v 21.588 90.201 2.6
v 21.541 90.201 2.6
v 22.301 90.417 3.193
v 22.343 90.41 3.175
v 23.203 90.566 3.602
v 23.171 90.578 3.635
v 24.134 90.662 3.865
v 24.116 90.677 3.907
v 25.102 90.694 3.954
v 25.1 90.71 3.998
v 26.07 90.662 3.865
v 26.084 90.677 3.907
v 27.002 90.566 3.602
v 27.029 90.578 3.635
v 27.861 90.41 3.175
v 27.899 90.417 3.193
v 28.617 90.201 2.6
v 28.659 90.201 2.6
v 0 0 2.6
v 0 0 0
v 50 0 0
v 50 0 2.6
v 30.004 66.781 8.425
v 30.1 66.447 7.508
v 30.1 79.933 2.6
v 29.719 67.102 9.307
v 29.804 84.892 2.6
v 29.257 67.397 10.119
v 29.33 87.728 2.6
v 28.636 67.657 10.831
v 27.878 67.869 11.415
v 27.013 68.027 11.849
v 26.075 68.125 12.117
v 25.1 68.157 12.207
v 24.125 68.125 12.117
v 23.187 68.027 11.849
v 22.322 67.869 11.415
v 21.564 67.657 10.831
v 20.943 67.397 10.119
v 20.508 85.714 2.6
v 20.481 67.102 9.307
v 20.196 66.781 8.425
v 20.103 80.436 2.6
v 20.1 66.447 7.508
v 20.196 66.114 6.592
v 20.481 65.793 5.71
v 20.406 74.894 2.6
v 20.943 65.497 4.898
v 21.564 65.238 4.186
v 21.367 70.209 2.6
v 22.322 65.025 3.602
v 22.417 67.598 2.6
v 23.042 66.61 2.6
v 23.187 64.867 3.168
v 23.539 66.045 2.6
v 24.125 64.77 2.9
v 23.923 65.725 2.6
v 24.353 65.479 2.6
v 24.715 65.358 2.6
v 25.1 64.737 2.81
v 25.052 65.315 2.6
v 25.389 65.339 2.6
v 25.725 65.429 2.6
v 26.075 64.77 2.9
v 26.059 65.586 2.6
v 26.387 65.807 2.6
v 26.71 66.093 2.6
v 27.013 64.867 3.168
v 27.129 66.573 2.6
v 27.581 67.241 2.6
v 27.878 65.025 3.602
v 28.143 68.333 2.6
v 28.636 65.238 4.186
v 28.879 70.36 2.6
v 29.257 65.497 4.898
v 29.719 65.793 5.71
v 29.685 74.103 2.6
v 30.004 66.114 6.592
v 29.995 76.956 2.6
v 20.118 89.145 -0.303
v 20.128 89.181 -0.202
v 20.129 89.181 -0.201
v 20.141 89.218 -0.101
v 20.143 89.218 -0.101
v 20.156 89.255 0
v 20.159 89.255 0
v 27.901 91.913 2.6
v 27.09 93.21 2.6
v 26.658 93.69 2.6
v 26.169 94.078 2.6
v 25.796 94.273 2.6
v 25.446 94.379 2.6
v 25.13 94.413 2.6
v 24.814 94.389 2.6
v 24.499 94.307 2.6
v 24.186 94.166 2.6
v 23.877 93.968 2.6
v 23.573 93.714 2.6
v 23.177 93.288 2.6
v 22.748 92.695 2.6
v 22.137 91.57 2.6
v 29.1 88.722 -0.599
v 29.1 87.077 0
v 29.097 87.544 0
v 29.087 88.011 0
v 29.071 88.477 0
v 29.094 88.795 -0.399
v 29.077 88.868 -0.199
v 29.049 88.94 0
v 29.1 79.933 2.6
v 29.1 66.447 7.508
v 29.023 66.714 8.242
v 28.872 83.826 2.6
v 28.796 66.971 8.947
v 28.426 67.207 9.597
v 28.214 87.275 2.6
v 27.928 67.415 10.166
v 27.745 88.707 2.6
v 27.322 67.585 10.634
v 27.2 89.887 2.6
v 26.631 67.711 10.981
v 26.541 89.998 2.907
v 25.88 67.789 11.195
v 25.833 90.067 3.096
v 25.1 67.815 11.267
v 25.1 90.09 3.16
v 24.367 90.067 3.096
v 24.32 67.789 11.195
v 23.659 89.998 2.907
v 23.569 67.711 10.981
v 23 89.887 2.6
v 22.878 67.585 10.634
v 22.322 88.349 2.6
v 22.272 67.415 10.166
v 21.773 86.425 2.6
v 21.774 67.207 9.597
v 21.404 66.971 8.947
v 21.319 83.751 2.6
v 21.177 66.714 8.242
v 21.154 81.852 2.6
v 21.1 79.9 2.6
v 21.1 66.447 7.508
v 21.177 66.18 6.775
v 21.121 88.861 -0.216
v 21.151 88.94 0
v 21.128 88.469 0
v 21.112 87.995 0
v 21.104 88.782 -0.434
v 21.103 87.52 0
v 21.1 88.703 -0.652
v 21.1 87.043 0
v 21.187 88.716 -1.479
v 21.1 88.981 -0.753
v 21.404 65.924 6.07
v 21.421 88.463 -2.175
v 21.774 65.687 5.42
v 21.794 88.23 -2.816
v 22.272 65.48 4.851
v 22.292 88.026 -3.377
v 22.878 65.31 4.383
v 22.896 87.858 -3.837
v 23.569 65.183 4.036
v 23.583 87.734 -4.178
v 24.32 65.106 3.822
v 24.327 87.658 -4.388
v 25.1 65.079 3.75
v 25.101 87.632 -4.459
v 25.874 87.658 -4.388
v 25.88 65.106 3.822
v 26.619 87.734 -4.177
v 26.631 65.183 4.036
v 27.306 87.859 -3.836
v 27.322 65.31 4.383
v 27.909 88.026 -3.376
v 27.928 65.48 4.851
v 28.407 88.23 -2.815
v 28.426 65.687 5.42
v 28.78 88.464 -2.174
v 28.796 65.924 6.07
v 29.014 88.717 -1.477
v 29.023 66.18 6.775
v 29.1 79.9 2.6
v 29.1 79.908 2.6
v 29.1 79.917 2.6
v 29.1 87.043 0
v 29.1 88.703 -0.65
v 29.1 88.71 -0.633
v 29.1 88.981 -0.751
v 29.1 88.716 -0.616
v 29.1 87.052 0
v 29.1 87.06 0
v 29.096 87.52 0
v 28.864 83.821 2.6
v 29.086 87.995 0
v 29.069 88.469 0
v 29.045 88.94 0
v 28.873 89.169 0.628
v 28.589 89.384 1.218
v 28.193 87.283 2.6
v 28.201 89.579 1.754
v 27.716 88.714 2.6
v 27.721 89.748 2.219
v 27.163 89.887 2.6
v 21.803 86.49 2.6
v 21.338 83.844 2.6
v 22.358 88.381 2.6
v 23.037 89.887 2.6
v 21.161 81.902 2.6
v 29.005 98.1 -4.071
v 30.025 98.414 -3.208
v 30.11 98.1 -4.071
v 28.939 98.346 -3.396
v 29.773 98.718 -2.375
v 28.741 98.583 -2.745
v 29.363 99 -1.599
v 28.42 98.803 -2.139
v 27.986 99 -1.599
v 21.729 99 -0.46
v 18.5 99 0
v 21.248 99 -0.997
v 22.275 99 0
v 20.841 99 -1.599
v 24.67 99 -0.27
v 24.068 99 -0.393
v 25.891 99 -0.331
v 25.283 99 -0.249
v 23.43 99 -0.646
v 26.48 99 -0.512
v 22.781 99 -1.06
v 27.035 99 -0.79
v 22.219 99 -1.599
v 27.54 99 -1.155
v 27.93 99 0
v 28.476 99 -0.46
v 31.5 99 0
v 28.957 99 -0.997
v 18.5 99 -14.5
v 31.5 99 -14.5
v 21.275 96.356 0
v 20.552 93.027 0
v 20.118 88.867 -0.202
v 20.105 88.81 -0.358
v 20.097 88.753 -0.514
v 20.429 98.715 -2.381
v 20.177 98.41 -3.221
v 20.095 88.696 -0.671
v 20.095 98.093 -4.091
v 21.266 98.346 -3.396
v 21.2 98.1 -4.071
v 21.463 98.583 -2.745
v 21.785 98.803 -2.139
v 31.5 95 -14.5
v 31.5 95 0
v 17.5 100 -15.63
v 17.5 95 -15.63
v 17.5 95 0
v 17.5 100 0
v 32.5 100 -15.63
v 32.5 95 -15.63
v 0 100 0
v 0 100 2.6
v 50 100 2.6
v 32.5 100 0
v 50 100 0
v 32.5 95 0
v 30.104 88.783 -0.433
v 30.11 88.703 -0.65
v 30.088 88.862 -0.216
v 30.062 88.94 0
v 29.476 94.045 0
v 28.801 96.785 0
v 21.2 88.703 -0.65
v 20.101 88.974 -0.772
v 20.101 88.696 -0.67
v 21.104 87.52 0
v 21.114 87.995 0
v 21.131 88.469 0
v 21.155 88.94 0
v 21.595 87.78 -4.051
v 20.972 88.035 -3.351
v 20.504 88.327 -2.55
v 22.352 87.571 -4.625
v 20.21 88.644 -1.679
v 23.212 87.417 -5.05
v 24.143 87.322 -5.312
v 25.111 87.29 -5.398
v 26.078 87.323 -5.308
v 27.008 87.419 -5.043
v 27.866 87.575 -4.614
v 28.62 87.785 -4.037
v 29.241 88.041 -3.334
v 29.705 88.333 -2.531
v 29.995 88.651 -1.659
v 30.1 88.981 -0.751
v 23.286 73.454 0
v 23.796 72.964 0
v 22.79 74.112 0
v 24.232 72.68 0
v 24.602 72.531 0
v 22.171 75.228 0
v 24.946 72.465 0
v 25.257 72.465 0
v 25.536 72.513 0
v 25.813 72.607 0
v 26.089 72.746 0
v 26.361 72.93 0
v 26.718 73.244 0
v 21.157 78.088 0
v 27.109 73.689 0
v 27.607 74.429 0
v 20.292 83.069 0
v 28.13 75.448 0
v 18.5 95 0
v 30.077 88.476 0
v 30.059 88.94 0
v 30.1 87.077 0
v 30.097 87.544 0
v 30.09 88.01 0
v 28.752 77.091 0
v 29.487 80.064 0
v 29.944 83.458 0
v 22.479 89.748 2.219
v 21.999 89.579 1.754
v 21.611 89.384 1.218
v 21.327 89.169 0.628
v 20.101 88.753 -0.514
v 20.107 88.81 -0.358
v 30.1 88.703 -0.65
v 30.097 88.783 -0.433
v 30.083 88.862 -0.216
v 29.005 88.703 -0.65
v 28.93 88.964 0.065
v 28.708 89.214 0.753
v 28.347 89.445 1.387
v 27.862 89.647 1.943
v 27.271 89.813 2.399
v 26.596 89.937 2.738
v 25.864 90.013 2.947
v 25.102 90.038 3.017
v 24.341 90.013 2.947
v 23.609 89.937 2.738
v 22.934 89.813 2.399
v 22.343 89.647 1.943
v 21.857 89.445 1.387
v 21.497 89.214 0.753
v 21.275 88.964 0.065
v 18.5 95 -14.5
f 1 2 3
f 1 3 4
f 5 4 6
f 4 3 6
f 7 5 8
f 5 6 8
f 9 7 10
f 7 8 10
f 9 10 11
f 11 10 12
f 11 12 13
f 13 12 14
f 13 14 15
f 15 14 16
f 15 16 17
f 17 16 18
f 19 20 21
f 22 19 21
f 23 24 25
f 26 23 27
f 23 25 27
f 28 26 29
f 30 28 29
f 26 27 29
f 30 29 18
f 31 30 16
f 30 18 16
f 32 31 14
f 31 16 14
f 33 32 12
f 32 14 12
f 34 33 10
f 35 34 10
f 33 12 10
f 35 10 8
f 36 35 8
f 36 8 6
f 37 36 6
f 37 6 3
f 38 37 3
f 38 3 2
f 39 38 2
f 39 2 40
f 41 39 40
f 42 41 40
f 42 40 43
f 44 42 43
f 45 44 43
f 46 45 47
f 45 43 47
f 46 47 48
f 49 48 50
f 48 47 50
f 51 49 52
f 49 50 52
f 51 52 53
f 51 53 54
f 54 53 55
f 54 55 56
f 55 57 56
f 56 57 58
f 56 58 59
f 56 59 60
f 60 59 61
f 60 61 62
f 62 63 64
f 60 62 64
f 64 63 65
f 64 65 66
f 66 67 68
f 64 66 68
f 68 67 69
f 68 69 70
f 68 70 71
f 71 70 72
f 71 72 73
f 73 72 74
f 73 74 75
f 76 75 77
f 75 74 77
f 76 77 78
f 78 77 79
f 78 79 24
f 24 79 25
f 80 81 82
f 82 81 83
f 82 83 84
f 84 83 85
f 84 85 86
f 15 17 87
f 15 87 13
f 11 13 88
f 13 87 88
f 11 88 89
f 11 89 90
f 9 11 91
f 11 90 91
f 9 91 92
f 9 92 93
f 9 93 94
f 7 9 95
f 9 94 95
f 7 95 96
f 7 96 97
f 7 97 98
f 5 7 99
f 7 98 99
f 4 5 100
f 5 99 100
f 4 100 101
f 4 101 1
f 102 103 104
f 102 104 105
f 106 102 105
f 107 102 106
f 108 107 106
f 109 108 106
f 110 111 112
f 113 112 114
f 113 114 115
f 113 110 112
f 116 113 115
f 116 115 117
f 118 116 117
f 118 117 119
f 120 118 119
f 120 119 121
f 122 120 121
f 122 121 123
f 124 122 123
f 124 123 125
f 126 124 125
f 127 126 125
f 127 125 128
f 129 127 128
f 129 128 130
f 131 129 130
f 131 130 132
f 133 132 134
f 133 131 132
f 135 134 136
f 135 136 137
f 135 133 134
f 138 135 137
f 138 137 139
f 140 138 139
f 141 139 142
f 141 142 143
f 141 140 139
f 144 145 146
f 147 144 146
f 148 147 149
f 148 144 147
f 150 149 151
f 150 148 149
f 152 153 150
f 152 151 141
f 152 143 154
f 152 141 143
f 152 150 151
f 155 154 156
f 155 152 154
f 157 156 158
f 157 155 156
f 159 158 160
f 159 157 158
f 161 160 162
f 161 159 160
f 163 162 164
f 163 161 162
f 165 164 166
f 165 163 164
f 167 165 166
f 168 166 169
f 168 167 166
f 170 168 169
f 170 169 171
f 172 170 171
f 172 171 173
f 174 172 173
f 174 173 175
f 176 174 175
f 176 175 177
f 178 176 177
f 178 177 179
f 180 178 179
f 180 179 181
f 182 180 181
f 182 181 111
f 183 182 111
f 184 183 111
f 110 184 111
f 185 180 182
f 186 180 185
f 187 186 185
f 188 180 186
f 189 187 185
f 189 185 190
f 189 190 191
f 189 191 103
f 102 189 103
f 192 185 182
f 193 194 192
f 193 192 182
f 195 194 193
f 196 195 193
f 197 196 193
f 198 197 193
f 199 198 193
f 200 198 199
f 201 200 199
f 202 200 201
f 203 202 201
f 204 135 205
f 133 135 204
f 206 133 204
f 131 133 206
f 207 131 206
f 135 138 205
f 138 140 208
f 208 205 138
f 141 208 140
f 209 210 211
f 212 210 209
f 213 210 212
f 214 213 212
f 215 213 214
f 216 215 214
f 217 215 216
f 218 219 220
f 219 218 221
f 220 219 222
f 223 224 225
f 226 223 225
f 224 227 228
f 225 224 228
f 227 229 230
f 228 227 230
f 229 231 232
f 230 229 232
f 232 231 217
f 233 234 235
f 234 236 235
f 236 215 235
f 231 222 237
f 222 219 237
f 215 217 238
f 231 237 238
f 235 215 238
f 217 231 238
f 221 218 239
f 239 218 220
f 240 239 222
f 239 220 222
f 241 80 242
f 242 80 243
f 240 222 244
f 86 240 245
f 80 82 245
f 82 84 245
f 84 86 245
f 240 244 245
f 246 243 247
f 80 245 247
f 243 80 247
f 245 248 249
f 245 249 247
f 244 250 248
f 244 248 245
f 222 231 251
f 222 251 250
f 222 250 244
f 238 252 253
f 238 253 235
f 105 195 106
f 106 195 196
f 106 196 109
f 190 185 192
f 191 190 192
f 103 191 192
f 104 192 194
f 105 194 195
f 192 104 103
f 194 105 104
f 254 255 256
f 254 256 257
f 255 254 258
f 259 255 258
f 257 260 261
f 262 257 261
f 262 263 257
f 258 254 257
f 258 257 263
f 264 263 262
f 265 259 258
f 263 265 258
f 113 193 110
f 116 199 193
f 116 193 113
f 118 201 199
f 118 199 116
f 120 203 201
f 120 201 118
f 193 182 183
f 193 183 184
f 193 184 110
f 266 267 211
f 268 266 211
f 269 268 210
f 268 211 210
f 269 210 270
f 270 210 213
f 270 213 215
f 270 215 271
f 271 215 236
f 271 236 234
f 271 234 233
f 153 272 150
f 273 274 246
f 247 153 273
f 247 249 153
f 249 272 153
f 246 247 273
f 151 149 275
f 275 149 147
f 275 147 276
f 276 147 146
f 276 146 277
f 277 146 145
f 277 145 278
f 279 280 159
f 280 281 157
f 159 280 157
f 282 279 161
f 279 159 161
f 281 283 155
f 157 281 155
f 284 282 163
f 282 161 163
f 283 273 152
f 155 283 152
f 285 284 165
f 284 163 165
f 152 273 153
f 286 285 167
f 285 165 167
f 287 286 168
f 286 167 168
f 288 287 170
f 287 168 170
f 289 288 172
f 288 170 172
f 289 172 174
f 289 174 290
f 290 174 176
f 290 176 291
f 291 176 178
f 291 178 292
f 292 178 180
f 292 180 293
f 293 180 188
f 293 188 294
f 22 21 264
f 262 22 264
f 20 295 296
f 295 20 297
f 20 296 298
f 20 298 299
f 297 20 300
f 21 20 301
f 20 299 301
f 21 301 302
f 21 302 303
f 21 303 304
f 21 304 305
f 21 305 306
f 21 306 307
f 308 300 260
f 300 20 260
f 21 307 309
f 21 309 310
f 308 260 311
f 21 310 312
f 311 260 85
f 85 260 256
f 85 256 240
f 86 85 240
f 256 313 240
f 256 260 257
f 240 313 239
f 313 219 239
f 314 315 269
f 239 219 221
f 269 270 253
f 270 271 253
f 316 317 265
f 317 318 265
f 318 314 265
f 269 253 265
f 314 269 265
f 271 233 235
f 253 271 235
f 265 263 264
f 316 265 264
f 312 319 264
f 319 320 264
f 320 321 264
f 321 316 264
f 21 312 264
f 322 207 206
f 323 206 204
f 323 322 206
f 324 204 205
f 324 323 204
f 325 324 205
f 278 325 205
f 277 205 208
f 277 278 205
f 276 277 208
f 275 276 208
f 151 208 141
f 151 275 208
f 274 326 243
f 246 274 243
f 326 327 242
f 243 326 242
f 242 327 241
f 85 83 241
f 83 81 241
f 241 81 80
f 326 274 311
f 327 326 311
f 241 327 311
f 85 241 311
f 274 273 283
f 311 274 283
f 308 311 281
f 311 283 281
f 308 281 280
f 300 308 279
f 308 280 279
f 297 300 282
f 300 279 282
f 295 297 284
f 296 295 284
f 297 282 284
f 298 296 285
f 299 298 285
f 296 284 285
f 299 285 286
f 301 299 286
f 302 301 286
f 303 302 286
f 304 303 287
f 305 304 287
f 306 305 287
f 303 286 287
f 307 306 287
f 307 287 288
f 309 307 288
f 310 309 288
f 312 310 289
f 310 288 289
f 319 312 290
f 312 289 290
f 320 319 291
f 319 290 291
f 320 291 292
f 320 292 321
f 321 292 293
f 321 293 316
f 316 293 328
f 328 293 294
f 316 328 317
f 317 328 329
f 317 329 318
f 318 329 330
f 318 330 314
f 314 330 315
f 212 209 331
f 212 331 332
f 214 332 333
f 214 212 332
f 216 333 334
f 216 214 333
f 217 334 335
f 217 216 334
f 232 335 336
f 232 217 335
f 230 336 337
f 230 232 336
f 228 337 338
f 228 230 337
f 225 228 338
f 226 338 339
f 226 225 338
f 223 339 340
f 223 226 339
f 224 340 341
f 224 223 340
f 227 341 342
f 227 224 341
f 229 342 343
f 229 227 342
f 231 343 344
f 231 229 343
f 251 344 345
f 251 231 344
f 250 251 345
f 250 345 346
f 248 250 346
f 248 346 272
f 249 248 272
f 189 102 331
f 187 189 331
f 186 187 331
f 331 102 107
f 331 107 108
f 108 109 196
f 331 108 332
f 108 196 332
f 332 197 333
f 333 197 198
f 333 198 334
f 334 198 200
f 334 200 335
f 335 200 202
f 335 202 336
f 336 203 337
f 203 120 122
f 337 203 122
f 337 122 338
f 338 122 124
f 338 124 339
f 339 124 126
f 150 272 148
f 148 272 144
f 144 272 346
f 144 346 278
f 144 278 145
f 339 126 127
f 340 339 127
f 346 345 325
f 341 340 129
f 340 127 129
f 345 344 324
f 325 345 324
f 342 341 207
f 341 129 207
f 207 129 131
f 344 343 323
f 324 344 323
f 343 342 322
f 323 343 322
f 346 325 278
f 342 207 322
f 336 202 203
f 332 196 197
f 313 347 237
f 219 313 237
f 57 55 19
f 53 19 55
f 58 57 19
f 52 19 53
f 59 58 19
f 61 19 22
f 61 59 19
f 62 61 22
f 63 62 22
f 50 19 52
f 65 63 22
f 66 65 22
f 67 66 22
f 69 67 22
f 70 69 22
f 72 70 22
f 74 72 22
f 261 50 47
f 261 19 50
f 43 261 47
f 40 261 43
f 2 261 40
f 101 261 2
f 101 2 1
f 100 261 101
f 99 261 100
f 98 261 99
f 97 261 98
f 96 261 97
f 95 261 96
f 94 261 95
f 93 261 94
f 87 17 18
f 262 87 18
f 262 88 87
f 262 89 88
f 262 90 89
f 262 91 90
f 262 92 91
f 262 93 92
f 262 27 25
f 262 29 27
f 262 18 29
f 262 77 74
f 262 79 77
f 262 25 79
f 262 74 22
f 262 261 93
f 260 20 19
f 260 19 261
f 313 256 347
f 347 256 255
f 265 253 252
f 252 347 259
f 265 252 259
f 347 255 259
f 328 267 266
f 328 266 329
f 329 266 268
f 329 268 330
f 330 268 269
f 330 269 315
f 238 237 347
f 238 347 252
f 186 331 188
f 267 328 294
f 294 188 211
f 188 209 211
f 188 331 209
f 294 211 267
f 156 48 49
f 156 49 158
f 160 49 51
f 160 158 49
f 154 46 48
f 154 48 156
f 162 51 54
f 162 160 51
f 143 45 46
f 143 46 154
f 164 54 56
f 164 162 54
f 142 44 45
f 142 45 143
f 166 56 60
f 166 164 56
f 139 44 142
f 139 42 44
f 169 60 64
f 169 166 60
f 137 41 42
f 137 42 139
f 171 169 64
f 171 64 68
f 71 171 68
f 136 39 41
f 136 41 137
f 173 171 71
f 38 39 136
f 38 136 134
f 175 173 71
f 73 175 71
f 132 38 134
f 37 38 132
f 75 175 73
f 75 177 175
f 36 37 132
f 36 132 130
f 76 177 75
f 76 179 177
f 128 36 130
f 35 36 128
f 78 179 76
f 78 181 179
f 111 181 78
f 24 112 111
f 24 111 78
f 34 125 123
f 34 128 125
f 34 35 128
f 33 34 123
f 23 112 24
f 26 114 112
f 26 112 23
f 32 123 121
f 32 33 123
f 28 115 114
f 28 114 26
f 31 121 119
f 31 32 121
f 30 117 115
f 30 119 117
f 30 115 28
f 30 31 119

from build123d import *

# Parameters (mm, degrees)
TUBE_R                   = 5
TUBE_R_2                 = 4
TUBE_DEPTH               = 24
TUBE_PLACEMENT_ANGLE     = 70
BOX002_W                 = 13
BOX002_H                 = 4
BOX002_DEPTH             = 16
BOX001_W                 = 15
BOX001_H                 = 5
BOX001_DEPTH             = 18
CYLINDER_R               = 4
CYLINDER_DEPTH           = 35
CYLINDER_PLACEMENT_ANGLE = 70
BOX_W                    = 50
BOX_H                    = 100
BOX_DEPTH                = 2.6
EXTRUDE_DEPTH            = 10
EXTRUDE_PLACEMENT_ANGLE  = 70


with BuildPart() as tube:
    # Tube → Tube (new body)
    with BuildSketch(Plane.XY):
        Circle(TUBE_R)
        Circle(TUBE_R_2, mode=Mode.SUBTRACT)
    extrude(amount=TUBE_DEPTH)


with BuildPart() as tube_1:
    # Tube placement: moved
    add(tube.part.moved(Location((25.1, 89, -0.7))).rotate(Axis((25.1, 89, -0.7), (1, 0, 0)), TUBE_PLACEMENT_ANGLE))


with BuildPart() as cube002:
    # Box002 → Box002 (new body)
    with BuildSketch(Plane(origin=(18.5, 45, -6), x_dir=(1, 0, 0), z_dir=(0, 0, 1))):
        with Locations((6.5, 2)):
            Rectangle(BOX002_W, BOX002_H)
    extrude(amount=BOX002_DEPTH)


with BuildPart() as cut001:
    # Box001 → Box001 (new body)
    with BuildSketch(Plane(origin=(17.5, 45, -7.13), x_dir=(1, 0, 0), z_dir=(0, 0, 1))):
        with Locations((7.5, 2.5)):
            Rectangle(BOX001_W, BOX001_H)
    extrude(amount=BOX001_DEPTH)

    # Cut001: cut Cube002
    add(cube002.part, mode=Mode.SUBTRACT)


with BuildPart() as cut001_1:
    # Cut001 placement: moved
    add(cut001.part.moved(Location((0, 50, -8.5))))


with BuildPart() as cylinder:
    # Cylinder → Cylinder (new body)
    with BuildSketch(Plane.XY):
        Circle(CYLINDER_R)
    extrude(amount=CYLINDER_DEPTH)


with BuildPart() as cylinder_1:
    # Cylinder placement: moved
    add(cylinder.part.moved(Location((25.1, 98, -4))).rotate(Axis((25.1, 98, -4), (1, 0, 0)), CYLINDER_PLACEMENT_ANGLE))


with BuildPart() as cut:
    # Box → Box (new body)
    with BuildSketch(Plane.XY):
        with Locations((25, 50)):
            Rectangle(BOX_W, BOX_H)
    extrude(amount=BOX_DEPTH)

    # Cut: cut Cylinder
    add(cylinder_1.part, mode=Mode.SUBTRACT)


with BuildPart() as fusion:
    # Sketch → Extrude (new body)
    with BuildSketch(Plane.XY):
        with BuildLine():
            ThreePointArc((29.005047, 25.145956), (25.102383, 29.048619), (21.199722, 25.145954))
            Line((21.199722, 25.145954), (20.095131, 25.124403))
            ThreePointArc((30.109684, 25.145956), (25.091608, 30.153244), (20.095131, 25.124403))
            Line((29.005047, 25.145956), (30.109684, 25.145956))
        make_face()
    extrude(amount=EXTRUDE_DEPTH)


with BuildPart() as fusion_1:
    # Extrude placement: moved
    add(fusion.part.moved(Location((0, 89.5, -27.7))).rotate(Axis((0, 89.5, -27.7), (1, 0, 0)), EXTRUDE_PLACEMENT_ANGLE))

    # Fusion: union Tube, Cut001, Cut
    add(tube_1.part)
    add(cut001_1.part)
    add(cut.part)


solid = fusion_1.part
